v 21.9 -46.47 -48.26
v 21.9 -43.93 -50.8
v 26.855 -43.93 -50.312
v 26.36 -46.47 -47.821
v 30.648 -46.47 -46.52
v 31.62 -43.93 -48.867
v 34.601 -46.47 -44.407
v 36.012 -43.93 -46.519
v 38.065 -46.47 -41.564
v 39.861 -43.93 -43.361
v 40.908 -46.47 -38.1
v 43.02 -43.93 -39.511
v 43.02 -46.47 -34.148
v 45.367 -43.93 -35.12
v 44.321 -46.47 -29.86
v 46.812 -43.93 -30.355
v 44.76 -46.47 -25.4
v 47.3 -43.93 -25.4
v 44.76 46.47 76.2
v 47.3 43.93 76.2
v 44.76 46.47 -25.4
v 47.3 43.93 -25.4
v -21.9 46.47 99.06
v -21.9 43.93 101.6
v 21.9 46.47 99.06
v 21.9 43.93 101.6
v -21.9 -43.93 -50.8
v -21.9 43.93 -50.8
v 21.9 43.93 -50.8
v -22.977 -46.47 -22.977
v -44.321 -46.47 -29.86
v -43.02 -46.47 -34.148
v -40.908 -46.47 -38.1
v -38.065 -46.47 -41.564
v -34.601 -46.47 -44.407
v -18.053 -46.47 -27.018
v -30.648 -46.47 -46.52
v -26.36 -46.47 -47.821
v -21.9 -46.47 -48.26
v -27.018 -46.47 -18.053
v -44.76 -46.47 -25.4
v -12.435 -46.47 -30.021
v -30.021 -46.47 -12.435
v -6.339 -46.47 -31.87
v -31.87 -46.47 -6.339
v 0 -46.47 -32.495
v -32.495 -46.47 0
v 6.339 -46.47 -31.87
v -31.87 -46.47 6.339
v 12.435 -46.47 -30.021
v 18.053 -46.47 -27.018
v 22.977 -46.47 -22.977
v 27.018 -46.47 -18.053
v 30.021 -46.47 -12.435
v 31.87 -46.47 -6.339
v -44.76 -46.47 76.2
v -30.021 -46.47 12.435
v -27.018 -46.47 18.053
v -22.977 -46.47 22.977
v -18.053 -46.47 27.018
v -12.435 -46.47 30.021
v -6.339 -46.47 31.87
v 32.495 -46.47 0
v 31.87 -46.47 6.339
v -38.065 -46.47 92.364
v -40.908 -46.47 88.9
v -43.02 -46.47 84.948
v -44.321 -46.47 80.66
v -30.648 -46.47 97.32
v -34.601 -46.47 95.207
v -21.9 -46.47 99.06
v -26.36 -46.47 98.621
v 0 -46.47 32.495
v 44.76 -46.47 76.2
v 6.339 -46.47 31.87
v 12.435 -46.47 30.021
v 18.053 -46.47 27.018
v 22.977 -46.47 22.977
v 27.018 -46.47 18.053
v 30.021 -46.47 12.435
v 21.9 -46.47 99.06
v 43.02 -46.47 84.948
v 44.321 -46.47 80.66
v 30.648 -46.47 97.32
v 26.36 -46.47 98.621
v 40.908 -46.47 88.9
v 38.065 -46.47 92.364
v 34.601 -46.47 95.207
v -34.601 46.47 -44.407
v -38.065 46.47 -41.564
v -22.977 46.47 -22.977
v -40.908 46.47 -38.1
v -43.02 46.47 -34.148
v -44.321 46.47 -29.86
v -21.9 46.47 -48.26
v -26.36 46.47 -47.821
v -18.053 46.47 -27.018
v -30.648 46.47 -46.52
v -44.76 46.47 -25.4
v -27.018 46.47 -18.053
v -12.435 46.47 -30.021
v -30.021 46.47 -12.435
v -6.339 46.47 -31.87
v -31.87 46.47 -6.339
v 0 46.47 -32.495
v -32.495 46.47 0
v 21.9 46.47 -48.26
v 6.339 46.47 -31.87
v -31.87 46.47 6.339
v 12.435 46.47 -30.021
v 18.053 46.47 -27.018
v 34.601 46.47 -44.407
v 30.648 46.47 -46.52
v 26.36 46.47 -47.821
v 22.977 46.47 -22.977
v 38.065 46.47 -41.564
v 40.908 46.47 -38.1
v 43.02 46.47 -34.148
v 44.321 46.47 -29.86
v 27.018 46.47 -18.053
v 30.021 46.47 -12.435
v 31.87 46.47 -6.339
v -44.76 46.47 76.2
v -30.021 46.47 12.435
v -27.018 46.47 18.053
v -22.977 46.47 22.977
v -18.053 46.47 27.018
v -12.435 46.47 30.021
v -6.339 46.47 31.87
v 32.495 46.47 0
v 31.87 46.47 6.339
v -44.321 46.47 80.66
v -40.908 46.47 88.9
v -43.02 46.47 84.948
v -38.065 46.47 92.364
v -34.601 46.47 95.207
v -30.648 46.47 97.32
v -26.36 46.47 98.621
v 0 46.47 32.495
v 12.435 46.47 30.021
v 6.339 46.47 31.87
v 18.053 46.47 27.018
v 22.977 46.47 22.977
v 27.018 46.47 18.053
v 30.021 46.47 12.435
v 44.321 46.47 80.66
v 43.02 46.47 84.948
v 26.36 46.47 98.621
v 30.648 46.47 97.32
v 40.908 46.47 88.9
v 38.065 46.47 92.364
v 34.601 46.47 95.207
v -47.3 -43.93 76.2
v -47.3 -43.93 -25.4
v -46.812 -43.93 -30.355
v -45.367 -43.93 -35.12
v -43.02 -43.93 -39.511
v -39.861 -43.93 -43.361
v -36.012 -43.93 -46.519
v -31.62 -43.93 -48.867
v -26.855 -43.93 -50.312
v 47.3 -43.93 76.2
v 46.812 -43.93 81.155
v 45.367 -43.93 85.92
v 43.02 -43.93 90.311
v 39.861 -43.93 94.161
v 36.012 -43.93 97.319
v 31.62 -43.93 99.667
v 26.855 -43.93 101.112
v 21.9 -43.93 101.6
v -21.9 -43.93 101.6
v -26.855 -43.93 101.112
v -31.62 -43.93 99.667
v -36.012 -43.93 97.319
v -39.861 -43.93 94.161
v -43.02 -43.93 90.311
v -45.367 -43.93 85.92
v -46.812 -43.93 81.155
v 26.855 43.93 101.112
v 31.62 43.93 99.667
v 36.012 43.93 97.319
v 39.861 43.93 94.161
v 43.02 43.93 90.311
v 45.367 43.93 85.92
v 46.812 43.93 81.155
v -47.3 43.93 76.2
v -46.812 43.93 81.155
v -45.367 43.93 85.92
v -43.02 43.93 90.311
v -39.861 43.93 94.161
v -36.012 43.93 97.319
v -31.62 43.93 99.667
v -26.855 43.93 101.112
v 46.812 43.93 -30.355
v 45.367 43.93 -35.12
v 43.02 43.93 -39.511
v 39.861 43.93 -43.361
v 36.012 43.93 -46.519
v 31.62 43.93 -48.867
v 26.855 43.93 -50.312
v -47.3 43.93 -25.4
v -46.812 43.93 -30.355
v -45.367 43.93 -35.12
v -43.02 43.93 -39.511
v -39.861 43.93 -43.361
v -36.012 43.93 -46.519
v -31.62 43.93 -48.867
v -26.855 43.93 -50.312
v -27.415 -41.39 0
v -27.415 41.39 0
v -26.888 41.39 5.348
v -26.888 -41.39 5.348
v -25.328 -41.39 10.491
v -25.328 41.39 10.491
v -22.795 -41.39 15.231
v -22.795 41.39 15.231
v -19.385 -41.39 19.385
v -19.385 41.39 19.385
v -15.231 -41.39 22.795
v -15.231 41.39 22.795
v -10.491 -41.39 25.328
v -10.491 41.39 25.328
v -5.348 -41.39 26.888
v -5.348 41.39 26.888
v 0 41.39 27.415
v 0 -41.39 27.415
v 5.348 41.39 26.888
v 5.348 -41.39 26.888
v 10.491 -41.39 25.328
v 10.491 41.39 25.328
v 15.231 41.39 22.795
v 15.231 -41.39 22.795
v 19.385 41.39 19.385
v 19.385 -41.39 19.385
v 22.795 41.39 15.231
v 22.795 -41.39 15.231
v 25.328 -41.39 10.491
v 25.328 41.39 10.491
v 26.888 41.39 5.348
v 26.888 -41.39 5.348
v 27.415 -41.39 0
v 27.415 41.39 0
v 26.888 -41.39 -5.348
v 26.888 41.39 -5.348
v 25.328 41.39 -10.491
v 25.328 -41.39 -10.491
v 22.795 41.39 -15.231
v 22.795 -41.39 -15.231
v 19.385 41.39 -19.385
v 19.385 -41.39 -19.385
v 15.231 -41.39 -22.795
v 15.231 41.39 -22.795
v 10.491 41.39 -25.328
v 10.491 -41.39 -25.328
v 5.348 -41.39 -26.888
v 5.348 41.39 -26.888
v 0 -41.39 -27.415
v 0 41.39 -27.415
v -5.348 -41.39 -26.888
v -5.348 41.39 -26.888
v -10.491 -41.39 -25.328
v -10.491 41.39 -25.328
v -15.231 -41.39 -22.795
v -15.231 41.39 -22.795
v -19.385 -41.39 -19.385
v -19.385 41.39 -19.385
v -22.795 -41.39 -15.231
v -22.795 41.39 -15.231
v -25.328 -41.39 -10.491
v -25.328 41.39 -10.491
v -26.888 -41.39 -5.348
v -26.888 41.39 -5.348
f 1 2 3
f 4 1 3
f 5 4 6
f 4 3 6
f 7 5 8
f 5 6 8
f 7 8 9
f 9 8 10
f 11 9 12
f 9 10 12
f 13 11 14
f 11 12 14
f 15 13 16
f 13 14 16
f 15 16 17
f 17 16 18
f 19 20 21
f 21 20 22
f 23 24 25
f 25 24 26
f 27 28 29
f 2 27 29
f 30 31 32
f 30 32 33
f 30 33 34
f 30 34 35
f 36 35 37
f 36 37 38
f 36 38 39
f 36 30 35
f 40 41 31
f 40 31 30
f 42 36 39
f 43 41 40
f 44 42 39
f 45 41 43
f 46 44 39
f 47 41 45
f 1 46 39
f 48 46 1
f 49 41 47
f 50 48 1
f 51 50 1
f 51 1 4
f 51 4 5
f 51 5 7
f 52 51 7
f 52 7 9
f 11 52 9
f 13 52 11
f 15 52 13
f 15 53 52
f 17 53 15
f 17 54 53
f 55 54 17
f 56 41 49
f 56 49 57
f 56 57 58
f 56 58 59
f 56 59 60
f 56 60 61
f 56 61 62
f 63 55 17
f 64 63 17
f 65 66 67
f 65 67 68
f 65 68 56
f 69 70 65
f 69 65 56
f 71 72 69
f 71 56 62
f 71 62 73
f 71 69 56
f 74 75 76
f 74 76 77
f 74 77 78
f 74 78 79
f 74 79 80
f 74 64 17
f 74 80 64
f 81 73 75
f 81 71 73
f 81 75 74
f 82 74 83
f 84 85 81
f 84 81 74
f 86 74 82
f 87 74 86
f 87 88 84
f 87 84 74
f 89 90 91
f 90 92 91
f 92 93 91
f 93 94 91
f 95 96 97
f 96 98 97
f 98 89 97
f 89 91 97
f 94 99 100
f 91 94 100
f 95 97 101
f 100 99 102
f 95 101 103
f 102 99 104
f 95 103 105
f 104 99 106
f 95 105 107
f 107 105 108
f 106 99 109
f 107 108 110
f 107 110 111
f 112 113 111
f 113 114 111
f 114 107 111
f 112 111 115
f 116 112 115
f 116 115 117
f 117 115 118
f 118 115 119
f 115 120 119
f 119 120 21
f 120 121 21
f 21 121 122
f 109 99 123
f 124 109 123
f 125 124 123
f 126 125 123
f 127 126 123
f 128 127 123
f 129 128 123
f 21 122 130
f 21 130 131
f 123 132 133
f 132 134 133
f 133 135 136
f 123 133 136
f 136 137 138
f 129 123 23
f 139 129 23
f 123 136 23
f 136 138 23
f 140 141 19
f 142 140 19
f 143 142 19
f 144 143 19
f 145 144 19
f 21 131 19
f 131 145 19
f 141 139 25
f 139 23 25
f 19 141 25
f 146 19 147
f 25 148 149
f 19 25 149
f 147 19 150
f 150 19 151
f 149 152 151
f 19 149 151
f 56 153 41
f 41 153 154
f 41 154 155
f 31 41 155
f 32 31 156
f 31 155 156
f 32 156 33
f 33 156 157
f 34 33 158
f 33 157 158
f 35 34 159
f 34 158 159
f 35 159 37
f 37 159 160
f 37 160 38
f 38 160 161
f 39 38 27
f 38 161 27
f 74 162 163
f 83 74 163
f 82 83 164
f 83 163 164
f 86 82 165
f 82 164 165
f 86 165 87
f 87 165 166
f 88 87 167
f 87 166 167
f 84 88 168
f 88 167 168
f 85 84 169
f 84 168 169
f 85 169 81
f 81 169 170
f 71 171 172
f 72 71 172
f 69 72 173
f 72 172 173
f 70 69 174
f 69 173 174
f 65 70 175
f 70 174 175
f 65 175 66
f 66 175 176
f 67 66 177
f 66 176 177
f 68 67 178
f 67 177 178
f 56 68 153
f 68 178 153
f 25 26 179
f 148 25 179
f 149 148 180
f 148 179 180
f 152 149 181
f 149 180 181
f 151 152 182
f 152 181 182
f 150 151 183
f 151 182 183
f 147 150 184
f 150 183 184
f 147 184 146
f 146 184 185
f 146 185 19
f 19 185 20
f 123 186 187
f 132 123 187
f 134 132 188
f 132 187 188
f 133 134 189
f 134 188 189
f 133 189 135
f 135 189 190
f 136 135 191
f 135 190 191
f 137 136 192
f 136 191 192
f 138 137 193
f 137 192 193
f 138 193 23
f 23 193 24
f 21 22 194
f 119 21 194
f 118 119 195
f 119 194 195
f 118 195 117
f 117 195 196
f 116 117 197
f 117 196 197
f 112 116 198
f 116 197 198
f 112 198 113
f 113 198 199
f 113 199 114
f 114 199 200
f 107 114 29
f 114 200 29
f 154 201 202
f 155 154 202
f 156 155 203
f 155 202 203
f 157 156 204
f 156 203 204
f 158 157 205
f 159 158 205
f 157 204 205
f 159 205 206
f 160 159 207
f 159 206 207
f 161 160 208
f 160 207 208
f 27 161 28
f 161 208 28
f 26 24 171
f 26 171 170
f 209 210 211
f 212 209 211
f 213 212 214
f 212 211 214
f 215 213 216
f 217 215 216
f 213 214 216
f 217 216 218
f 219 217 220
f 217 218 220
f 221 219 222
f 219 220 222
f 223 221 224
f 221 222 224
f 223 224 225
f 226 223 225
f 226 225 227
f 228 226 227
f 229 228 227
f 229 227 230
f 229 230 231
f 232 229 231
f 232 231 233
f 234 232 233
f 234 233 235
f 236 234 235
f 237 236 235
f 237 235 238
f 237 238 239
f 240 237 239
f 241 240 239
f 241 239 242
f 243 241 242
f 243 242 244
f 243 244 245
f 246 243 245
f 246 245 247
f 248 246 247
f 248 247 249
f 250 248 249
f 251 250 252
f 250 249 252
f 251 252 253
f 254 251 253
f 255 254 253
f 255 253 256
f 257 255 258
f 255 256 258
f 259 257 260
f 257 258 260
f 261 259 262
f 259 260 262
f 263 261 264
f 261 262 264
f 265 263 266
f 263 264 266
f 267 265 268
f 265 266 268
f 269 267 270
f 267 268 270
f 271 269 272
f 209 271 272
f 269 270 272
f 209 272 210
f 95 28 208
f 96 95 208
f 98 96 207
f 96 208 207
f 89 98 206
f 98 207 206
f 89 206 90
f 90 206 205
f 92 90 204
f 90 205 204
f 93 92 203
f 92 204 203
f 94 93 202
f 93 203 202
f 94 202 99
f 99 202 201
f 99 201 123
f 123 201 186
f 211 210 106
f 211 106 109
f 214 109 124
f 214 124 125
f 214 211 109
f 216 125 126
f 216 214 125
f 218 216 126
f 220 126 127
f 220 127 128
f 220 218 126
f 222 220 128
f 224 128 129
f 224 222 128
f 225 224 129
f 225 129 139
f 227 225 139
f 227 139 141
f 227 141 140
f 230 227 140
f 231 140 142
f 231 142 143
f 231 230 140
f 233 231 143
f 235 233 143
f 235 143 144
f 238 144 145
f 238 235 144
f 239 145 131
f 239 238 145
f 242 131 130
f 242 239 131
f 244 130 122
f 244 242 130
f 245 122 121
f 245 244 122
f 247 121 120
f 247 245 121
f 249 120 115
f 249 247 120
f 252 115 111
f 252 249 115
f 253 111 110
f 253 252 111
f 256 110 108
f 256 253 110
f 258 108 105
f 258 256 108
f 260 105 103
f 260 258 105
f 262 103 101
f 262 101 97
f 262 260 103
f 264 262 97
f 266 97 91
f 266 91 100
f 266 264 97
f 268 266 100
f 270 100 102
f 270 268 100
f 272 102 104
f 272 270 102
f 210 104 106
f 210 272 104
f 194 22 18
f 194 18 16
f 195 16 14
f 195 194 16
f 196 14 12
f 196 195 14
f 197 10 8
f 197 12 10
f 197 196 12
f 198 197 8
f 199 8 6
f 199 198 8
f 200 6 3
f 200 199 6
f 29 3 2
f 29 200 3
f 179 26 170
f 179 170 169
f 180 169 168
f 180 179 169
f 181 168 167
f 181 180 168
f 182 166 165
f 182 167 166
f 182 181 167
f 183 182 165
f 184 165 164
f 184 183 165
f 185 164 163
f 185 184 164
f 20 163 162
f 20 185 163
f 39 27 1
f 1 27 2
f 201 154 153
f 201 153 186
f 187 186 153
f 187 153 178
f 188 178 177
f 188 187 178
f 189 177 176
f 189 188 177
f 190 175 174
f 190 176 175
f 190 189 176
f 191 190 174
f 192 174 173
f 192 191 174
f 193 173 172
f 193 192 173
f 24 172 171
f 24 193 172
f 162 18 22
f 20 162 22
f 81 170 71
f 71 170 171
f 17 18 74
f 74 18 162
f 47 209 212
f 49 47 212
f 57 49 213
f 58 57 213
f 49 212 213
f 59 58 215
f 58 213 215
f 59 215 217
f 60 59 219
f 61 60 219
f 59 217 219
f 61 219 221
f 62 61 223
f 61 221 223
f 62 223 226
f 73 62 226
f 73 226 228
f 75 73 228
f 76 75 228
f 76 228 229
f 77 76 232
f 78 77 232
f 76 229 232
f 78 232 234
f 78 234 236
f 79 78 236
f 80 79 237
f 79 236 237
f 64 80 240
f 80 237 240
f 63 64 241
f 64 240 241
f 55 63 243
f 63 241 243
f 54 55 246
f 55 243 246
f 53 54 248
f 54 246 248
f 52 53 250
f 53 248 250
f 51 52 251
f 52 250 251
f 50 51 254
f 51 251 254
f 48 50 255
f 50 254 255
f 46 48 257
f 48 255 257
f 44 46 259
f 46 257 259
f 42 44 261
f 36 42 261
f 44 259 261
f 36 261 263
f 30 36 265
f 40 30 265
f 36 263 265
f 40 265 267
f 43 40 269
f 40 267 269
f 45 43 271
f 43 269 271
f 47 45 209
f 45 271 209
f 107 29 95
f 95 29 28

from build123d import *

# Parameters (mm, degrees)
F0_W          = 94.60038
F0_H          = 92.940778
F1_DEPTH      = 101.6
F1_DEPTH_BACK = 50.8
F2_R          = 25.4
F3_SIZE       = 2.54
F4_R          = 27.414742
F5_DEPTH      = 138.78718
F6_SIZE       = 5.08


with BuildPart() as f1:
    # F0 (on Top) → F1 (new body, two sides)
    with BuildSketch(Plane.XY) as f1_sk:
        Rectangle(F0_W, F0_H)
    extrude(amount=F1_DEPTH)
    extrude(f1_sk.sketch, amount=-F1_DEPTH_BACK)

    # F2
    f2_edges = [f1.edges().sort_by_distance(p)[0] for p in [
        (-47.30019, 0, 101.6),
        (47.30019, 0, 101.6),
        (-47.30019, 0, -50.8),
        (47.30019, 0, -50.8),
    ]]
    fillet(f2_edges, radius=F2_R)

    # F3
    f3_edges = [f1.edges().sort_by_distance(p)[0] for p in [
        (47.30019, 46.470389, 25.4),
        (47.30019, -46.470389, 25.4),
    ]]
    chamfer(f3_edges, length=F3_SIZE)

    # F4 (on face) → F5 (cut)
    with BuildSketch(Plane(origin=(0, 46.470389, 0), x_dir=(-1, 0, 0), z_dir=(0, 1, 0))):
        Circle(F4_R)
    extrude(amount=-F5_DEPTH, mode=Mode.SUBTRACT)

    # F6
    f6_edges = [f1.edges().sort_by_distance(p)[0] for p in [
        (27.414742, -46.470389, 0),
        (27.414742, 46.470389, 0),
    ]]
    chamfer(f6_edges, length=F6_SIZE)


solid = f1.part
